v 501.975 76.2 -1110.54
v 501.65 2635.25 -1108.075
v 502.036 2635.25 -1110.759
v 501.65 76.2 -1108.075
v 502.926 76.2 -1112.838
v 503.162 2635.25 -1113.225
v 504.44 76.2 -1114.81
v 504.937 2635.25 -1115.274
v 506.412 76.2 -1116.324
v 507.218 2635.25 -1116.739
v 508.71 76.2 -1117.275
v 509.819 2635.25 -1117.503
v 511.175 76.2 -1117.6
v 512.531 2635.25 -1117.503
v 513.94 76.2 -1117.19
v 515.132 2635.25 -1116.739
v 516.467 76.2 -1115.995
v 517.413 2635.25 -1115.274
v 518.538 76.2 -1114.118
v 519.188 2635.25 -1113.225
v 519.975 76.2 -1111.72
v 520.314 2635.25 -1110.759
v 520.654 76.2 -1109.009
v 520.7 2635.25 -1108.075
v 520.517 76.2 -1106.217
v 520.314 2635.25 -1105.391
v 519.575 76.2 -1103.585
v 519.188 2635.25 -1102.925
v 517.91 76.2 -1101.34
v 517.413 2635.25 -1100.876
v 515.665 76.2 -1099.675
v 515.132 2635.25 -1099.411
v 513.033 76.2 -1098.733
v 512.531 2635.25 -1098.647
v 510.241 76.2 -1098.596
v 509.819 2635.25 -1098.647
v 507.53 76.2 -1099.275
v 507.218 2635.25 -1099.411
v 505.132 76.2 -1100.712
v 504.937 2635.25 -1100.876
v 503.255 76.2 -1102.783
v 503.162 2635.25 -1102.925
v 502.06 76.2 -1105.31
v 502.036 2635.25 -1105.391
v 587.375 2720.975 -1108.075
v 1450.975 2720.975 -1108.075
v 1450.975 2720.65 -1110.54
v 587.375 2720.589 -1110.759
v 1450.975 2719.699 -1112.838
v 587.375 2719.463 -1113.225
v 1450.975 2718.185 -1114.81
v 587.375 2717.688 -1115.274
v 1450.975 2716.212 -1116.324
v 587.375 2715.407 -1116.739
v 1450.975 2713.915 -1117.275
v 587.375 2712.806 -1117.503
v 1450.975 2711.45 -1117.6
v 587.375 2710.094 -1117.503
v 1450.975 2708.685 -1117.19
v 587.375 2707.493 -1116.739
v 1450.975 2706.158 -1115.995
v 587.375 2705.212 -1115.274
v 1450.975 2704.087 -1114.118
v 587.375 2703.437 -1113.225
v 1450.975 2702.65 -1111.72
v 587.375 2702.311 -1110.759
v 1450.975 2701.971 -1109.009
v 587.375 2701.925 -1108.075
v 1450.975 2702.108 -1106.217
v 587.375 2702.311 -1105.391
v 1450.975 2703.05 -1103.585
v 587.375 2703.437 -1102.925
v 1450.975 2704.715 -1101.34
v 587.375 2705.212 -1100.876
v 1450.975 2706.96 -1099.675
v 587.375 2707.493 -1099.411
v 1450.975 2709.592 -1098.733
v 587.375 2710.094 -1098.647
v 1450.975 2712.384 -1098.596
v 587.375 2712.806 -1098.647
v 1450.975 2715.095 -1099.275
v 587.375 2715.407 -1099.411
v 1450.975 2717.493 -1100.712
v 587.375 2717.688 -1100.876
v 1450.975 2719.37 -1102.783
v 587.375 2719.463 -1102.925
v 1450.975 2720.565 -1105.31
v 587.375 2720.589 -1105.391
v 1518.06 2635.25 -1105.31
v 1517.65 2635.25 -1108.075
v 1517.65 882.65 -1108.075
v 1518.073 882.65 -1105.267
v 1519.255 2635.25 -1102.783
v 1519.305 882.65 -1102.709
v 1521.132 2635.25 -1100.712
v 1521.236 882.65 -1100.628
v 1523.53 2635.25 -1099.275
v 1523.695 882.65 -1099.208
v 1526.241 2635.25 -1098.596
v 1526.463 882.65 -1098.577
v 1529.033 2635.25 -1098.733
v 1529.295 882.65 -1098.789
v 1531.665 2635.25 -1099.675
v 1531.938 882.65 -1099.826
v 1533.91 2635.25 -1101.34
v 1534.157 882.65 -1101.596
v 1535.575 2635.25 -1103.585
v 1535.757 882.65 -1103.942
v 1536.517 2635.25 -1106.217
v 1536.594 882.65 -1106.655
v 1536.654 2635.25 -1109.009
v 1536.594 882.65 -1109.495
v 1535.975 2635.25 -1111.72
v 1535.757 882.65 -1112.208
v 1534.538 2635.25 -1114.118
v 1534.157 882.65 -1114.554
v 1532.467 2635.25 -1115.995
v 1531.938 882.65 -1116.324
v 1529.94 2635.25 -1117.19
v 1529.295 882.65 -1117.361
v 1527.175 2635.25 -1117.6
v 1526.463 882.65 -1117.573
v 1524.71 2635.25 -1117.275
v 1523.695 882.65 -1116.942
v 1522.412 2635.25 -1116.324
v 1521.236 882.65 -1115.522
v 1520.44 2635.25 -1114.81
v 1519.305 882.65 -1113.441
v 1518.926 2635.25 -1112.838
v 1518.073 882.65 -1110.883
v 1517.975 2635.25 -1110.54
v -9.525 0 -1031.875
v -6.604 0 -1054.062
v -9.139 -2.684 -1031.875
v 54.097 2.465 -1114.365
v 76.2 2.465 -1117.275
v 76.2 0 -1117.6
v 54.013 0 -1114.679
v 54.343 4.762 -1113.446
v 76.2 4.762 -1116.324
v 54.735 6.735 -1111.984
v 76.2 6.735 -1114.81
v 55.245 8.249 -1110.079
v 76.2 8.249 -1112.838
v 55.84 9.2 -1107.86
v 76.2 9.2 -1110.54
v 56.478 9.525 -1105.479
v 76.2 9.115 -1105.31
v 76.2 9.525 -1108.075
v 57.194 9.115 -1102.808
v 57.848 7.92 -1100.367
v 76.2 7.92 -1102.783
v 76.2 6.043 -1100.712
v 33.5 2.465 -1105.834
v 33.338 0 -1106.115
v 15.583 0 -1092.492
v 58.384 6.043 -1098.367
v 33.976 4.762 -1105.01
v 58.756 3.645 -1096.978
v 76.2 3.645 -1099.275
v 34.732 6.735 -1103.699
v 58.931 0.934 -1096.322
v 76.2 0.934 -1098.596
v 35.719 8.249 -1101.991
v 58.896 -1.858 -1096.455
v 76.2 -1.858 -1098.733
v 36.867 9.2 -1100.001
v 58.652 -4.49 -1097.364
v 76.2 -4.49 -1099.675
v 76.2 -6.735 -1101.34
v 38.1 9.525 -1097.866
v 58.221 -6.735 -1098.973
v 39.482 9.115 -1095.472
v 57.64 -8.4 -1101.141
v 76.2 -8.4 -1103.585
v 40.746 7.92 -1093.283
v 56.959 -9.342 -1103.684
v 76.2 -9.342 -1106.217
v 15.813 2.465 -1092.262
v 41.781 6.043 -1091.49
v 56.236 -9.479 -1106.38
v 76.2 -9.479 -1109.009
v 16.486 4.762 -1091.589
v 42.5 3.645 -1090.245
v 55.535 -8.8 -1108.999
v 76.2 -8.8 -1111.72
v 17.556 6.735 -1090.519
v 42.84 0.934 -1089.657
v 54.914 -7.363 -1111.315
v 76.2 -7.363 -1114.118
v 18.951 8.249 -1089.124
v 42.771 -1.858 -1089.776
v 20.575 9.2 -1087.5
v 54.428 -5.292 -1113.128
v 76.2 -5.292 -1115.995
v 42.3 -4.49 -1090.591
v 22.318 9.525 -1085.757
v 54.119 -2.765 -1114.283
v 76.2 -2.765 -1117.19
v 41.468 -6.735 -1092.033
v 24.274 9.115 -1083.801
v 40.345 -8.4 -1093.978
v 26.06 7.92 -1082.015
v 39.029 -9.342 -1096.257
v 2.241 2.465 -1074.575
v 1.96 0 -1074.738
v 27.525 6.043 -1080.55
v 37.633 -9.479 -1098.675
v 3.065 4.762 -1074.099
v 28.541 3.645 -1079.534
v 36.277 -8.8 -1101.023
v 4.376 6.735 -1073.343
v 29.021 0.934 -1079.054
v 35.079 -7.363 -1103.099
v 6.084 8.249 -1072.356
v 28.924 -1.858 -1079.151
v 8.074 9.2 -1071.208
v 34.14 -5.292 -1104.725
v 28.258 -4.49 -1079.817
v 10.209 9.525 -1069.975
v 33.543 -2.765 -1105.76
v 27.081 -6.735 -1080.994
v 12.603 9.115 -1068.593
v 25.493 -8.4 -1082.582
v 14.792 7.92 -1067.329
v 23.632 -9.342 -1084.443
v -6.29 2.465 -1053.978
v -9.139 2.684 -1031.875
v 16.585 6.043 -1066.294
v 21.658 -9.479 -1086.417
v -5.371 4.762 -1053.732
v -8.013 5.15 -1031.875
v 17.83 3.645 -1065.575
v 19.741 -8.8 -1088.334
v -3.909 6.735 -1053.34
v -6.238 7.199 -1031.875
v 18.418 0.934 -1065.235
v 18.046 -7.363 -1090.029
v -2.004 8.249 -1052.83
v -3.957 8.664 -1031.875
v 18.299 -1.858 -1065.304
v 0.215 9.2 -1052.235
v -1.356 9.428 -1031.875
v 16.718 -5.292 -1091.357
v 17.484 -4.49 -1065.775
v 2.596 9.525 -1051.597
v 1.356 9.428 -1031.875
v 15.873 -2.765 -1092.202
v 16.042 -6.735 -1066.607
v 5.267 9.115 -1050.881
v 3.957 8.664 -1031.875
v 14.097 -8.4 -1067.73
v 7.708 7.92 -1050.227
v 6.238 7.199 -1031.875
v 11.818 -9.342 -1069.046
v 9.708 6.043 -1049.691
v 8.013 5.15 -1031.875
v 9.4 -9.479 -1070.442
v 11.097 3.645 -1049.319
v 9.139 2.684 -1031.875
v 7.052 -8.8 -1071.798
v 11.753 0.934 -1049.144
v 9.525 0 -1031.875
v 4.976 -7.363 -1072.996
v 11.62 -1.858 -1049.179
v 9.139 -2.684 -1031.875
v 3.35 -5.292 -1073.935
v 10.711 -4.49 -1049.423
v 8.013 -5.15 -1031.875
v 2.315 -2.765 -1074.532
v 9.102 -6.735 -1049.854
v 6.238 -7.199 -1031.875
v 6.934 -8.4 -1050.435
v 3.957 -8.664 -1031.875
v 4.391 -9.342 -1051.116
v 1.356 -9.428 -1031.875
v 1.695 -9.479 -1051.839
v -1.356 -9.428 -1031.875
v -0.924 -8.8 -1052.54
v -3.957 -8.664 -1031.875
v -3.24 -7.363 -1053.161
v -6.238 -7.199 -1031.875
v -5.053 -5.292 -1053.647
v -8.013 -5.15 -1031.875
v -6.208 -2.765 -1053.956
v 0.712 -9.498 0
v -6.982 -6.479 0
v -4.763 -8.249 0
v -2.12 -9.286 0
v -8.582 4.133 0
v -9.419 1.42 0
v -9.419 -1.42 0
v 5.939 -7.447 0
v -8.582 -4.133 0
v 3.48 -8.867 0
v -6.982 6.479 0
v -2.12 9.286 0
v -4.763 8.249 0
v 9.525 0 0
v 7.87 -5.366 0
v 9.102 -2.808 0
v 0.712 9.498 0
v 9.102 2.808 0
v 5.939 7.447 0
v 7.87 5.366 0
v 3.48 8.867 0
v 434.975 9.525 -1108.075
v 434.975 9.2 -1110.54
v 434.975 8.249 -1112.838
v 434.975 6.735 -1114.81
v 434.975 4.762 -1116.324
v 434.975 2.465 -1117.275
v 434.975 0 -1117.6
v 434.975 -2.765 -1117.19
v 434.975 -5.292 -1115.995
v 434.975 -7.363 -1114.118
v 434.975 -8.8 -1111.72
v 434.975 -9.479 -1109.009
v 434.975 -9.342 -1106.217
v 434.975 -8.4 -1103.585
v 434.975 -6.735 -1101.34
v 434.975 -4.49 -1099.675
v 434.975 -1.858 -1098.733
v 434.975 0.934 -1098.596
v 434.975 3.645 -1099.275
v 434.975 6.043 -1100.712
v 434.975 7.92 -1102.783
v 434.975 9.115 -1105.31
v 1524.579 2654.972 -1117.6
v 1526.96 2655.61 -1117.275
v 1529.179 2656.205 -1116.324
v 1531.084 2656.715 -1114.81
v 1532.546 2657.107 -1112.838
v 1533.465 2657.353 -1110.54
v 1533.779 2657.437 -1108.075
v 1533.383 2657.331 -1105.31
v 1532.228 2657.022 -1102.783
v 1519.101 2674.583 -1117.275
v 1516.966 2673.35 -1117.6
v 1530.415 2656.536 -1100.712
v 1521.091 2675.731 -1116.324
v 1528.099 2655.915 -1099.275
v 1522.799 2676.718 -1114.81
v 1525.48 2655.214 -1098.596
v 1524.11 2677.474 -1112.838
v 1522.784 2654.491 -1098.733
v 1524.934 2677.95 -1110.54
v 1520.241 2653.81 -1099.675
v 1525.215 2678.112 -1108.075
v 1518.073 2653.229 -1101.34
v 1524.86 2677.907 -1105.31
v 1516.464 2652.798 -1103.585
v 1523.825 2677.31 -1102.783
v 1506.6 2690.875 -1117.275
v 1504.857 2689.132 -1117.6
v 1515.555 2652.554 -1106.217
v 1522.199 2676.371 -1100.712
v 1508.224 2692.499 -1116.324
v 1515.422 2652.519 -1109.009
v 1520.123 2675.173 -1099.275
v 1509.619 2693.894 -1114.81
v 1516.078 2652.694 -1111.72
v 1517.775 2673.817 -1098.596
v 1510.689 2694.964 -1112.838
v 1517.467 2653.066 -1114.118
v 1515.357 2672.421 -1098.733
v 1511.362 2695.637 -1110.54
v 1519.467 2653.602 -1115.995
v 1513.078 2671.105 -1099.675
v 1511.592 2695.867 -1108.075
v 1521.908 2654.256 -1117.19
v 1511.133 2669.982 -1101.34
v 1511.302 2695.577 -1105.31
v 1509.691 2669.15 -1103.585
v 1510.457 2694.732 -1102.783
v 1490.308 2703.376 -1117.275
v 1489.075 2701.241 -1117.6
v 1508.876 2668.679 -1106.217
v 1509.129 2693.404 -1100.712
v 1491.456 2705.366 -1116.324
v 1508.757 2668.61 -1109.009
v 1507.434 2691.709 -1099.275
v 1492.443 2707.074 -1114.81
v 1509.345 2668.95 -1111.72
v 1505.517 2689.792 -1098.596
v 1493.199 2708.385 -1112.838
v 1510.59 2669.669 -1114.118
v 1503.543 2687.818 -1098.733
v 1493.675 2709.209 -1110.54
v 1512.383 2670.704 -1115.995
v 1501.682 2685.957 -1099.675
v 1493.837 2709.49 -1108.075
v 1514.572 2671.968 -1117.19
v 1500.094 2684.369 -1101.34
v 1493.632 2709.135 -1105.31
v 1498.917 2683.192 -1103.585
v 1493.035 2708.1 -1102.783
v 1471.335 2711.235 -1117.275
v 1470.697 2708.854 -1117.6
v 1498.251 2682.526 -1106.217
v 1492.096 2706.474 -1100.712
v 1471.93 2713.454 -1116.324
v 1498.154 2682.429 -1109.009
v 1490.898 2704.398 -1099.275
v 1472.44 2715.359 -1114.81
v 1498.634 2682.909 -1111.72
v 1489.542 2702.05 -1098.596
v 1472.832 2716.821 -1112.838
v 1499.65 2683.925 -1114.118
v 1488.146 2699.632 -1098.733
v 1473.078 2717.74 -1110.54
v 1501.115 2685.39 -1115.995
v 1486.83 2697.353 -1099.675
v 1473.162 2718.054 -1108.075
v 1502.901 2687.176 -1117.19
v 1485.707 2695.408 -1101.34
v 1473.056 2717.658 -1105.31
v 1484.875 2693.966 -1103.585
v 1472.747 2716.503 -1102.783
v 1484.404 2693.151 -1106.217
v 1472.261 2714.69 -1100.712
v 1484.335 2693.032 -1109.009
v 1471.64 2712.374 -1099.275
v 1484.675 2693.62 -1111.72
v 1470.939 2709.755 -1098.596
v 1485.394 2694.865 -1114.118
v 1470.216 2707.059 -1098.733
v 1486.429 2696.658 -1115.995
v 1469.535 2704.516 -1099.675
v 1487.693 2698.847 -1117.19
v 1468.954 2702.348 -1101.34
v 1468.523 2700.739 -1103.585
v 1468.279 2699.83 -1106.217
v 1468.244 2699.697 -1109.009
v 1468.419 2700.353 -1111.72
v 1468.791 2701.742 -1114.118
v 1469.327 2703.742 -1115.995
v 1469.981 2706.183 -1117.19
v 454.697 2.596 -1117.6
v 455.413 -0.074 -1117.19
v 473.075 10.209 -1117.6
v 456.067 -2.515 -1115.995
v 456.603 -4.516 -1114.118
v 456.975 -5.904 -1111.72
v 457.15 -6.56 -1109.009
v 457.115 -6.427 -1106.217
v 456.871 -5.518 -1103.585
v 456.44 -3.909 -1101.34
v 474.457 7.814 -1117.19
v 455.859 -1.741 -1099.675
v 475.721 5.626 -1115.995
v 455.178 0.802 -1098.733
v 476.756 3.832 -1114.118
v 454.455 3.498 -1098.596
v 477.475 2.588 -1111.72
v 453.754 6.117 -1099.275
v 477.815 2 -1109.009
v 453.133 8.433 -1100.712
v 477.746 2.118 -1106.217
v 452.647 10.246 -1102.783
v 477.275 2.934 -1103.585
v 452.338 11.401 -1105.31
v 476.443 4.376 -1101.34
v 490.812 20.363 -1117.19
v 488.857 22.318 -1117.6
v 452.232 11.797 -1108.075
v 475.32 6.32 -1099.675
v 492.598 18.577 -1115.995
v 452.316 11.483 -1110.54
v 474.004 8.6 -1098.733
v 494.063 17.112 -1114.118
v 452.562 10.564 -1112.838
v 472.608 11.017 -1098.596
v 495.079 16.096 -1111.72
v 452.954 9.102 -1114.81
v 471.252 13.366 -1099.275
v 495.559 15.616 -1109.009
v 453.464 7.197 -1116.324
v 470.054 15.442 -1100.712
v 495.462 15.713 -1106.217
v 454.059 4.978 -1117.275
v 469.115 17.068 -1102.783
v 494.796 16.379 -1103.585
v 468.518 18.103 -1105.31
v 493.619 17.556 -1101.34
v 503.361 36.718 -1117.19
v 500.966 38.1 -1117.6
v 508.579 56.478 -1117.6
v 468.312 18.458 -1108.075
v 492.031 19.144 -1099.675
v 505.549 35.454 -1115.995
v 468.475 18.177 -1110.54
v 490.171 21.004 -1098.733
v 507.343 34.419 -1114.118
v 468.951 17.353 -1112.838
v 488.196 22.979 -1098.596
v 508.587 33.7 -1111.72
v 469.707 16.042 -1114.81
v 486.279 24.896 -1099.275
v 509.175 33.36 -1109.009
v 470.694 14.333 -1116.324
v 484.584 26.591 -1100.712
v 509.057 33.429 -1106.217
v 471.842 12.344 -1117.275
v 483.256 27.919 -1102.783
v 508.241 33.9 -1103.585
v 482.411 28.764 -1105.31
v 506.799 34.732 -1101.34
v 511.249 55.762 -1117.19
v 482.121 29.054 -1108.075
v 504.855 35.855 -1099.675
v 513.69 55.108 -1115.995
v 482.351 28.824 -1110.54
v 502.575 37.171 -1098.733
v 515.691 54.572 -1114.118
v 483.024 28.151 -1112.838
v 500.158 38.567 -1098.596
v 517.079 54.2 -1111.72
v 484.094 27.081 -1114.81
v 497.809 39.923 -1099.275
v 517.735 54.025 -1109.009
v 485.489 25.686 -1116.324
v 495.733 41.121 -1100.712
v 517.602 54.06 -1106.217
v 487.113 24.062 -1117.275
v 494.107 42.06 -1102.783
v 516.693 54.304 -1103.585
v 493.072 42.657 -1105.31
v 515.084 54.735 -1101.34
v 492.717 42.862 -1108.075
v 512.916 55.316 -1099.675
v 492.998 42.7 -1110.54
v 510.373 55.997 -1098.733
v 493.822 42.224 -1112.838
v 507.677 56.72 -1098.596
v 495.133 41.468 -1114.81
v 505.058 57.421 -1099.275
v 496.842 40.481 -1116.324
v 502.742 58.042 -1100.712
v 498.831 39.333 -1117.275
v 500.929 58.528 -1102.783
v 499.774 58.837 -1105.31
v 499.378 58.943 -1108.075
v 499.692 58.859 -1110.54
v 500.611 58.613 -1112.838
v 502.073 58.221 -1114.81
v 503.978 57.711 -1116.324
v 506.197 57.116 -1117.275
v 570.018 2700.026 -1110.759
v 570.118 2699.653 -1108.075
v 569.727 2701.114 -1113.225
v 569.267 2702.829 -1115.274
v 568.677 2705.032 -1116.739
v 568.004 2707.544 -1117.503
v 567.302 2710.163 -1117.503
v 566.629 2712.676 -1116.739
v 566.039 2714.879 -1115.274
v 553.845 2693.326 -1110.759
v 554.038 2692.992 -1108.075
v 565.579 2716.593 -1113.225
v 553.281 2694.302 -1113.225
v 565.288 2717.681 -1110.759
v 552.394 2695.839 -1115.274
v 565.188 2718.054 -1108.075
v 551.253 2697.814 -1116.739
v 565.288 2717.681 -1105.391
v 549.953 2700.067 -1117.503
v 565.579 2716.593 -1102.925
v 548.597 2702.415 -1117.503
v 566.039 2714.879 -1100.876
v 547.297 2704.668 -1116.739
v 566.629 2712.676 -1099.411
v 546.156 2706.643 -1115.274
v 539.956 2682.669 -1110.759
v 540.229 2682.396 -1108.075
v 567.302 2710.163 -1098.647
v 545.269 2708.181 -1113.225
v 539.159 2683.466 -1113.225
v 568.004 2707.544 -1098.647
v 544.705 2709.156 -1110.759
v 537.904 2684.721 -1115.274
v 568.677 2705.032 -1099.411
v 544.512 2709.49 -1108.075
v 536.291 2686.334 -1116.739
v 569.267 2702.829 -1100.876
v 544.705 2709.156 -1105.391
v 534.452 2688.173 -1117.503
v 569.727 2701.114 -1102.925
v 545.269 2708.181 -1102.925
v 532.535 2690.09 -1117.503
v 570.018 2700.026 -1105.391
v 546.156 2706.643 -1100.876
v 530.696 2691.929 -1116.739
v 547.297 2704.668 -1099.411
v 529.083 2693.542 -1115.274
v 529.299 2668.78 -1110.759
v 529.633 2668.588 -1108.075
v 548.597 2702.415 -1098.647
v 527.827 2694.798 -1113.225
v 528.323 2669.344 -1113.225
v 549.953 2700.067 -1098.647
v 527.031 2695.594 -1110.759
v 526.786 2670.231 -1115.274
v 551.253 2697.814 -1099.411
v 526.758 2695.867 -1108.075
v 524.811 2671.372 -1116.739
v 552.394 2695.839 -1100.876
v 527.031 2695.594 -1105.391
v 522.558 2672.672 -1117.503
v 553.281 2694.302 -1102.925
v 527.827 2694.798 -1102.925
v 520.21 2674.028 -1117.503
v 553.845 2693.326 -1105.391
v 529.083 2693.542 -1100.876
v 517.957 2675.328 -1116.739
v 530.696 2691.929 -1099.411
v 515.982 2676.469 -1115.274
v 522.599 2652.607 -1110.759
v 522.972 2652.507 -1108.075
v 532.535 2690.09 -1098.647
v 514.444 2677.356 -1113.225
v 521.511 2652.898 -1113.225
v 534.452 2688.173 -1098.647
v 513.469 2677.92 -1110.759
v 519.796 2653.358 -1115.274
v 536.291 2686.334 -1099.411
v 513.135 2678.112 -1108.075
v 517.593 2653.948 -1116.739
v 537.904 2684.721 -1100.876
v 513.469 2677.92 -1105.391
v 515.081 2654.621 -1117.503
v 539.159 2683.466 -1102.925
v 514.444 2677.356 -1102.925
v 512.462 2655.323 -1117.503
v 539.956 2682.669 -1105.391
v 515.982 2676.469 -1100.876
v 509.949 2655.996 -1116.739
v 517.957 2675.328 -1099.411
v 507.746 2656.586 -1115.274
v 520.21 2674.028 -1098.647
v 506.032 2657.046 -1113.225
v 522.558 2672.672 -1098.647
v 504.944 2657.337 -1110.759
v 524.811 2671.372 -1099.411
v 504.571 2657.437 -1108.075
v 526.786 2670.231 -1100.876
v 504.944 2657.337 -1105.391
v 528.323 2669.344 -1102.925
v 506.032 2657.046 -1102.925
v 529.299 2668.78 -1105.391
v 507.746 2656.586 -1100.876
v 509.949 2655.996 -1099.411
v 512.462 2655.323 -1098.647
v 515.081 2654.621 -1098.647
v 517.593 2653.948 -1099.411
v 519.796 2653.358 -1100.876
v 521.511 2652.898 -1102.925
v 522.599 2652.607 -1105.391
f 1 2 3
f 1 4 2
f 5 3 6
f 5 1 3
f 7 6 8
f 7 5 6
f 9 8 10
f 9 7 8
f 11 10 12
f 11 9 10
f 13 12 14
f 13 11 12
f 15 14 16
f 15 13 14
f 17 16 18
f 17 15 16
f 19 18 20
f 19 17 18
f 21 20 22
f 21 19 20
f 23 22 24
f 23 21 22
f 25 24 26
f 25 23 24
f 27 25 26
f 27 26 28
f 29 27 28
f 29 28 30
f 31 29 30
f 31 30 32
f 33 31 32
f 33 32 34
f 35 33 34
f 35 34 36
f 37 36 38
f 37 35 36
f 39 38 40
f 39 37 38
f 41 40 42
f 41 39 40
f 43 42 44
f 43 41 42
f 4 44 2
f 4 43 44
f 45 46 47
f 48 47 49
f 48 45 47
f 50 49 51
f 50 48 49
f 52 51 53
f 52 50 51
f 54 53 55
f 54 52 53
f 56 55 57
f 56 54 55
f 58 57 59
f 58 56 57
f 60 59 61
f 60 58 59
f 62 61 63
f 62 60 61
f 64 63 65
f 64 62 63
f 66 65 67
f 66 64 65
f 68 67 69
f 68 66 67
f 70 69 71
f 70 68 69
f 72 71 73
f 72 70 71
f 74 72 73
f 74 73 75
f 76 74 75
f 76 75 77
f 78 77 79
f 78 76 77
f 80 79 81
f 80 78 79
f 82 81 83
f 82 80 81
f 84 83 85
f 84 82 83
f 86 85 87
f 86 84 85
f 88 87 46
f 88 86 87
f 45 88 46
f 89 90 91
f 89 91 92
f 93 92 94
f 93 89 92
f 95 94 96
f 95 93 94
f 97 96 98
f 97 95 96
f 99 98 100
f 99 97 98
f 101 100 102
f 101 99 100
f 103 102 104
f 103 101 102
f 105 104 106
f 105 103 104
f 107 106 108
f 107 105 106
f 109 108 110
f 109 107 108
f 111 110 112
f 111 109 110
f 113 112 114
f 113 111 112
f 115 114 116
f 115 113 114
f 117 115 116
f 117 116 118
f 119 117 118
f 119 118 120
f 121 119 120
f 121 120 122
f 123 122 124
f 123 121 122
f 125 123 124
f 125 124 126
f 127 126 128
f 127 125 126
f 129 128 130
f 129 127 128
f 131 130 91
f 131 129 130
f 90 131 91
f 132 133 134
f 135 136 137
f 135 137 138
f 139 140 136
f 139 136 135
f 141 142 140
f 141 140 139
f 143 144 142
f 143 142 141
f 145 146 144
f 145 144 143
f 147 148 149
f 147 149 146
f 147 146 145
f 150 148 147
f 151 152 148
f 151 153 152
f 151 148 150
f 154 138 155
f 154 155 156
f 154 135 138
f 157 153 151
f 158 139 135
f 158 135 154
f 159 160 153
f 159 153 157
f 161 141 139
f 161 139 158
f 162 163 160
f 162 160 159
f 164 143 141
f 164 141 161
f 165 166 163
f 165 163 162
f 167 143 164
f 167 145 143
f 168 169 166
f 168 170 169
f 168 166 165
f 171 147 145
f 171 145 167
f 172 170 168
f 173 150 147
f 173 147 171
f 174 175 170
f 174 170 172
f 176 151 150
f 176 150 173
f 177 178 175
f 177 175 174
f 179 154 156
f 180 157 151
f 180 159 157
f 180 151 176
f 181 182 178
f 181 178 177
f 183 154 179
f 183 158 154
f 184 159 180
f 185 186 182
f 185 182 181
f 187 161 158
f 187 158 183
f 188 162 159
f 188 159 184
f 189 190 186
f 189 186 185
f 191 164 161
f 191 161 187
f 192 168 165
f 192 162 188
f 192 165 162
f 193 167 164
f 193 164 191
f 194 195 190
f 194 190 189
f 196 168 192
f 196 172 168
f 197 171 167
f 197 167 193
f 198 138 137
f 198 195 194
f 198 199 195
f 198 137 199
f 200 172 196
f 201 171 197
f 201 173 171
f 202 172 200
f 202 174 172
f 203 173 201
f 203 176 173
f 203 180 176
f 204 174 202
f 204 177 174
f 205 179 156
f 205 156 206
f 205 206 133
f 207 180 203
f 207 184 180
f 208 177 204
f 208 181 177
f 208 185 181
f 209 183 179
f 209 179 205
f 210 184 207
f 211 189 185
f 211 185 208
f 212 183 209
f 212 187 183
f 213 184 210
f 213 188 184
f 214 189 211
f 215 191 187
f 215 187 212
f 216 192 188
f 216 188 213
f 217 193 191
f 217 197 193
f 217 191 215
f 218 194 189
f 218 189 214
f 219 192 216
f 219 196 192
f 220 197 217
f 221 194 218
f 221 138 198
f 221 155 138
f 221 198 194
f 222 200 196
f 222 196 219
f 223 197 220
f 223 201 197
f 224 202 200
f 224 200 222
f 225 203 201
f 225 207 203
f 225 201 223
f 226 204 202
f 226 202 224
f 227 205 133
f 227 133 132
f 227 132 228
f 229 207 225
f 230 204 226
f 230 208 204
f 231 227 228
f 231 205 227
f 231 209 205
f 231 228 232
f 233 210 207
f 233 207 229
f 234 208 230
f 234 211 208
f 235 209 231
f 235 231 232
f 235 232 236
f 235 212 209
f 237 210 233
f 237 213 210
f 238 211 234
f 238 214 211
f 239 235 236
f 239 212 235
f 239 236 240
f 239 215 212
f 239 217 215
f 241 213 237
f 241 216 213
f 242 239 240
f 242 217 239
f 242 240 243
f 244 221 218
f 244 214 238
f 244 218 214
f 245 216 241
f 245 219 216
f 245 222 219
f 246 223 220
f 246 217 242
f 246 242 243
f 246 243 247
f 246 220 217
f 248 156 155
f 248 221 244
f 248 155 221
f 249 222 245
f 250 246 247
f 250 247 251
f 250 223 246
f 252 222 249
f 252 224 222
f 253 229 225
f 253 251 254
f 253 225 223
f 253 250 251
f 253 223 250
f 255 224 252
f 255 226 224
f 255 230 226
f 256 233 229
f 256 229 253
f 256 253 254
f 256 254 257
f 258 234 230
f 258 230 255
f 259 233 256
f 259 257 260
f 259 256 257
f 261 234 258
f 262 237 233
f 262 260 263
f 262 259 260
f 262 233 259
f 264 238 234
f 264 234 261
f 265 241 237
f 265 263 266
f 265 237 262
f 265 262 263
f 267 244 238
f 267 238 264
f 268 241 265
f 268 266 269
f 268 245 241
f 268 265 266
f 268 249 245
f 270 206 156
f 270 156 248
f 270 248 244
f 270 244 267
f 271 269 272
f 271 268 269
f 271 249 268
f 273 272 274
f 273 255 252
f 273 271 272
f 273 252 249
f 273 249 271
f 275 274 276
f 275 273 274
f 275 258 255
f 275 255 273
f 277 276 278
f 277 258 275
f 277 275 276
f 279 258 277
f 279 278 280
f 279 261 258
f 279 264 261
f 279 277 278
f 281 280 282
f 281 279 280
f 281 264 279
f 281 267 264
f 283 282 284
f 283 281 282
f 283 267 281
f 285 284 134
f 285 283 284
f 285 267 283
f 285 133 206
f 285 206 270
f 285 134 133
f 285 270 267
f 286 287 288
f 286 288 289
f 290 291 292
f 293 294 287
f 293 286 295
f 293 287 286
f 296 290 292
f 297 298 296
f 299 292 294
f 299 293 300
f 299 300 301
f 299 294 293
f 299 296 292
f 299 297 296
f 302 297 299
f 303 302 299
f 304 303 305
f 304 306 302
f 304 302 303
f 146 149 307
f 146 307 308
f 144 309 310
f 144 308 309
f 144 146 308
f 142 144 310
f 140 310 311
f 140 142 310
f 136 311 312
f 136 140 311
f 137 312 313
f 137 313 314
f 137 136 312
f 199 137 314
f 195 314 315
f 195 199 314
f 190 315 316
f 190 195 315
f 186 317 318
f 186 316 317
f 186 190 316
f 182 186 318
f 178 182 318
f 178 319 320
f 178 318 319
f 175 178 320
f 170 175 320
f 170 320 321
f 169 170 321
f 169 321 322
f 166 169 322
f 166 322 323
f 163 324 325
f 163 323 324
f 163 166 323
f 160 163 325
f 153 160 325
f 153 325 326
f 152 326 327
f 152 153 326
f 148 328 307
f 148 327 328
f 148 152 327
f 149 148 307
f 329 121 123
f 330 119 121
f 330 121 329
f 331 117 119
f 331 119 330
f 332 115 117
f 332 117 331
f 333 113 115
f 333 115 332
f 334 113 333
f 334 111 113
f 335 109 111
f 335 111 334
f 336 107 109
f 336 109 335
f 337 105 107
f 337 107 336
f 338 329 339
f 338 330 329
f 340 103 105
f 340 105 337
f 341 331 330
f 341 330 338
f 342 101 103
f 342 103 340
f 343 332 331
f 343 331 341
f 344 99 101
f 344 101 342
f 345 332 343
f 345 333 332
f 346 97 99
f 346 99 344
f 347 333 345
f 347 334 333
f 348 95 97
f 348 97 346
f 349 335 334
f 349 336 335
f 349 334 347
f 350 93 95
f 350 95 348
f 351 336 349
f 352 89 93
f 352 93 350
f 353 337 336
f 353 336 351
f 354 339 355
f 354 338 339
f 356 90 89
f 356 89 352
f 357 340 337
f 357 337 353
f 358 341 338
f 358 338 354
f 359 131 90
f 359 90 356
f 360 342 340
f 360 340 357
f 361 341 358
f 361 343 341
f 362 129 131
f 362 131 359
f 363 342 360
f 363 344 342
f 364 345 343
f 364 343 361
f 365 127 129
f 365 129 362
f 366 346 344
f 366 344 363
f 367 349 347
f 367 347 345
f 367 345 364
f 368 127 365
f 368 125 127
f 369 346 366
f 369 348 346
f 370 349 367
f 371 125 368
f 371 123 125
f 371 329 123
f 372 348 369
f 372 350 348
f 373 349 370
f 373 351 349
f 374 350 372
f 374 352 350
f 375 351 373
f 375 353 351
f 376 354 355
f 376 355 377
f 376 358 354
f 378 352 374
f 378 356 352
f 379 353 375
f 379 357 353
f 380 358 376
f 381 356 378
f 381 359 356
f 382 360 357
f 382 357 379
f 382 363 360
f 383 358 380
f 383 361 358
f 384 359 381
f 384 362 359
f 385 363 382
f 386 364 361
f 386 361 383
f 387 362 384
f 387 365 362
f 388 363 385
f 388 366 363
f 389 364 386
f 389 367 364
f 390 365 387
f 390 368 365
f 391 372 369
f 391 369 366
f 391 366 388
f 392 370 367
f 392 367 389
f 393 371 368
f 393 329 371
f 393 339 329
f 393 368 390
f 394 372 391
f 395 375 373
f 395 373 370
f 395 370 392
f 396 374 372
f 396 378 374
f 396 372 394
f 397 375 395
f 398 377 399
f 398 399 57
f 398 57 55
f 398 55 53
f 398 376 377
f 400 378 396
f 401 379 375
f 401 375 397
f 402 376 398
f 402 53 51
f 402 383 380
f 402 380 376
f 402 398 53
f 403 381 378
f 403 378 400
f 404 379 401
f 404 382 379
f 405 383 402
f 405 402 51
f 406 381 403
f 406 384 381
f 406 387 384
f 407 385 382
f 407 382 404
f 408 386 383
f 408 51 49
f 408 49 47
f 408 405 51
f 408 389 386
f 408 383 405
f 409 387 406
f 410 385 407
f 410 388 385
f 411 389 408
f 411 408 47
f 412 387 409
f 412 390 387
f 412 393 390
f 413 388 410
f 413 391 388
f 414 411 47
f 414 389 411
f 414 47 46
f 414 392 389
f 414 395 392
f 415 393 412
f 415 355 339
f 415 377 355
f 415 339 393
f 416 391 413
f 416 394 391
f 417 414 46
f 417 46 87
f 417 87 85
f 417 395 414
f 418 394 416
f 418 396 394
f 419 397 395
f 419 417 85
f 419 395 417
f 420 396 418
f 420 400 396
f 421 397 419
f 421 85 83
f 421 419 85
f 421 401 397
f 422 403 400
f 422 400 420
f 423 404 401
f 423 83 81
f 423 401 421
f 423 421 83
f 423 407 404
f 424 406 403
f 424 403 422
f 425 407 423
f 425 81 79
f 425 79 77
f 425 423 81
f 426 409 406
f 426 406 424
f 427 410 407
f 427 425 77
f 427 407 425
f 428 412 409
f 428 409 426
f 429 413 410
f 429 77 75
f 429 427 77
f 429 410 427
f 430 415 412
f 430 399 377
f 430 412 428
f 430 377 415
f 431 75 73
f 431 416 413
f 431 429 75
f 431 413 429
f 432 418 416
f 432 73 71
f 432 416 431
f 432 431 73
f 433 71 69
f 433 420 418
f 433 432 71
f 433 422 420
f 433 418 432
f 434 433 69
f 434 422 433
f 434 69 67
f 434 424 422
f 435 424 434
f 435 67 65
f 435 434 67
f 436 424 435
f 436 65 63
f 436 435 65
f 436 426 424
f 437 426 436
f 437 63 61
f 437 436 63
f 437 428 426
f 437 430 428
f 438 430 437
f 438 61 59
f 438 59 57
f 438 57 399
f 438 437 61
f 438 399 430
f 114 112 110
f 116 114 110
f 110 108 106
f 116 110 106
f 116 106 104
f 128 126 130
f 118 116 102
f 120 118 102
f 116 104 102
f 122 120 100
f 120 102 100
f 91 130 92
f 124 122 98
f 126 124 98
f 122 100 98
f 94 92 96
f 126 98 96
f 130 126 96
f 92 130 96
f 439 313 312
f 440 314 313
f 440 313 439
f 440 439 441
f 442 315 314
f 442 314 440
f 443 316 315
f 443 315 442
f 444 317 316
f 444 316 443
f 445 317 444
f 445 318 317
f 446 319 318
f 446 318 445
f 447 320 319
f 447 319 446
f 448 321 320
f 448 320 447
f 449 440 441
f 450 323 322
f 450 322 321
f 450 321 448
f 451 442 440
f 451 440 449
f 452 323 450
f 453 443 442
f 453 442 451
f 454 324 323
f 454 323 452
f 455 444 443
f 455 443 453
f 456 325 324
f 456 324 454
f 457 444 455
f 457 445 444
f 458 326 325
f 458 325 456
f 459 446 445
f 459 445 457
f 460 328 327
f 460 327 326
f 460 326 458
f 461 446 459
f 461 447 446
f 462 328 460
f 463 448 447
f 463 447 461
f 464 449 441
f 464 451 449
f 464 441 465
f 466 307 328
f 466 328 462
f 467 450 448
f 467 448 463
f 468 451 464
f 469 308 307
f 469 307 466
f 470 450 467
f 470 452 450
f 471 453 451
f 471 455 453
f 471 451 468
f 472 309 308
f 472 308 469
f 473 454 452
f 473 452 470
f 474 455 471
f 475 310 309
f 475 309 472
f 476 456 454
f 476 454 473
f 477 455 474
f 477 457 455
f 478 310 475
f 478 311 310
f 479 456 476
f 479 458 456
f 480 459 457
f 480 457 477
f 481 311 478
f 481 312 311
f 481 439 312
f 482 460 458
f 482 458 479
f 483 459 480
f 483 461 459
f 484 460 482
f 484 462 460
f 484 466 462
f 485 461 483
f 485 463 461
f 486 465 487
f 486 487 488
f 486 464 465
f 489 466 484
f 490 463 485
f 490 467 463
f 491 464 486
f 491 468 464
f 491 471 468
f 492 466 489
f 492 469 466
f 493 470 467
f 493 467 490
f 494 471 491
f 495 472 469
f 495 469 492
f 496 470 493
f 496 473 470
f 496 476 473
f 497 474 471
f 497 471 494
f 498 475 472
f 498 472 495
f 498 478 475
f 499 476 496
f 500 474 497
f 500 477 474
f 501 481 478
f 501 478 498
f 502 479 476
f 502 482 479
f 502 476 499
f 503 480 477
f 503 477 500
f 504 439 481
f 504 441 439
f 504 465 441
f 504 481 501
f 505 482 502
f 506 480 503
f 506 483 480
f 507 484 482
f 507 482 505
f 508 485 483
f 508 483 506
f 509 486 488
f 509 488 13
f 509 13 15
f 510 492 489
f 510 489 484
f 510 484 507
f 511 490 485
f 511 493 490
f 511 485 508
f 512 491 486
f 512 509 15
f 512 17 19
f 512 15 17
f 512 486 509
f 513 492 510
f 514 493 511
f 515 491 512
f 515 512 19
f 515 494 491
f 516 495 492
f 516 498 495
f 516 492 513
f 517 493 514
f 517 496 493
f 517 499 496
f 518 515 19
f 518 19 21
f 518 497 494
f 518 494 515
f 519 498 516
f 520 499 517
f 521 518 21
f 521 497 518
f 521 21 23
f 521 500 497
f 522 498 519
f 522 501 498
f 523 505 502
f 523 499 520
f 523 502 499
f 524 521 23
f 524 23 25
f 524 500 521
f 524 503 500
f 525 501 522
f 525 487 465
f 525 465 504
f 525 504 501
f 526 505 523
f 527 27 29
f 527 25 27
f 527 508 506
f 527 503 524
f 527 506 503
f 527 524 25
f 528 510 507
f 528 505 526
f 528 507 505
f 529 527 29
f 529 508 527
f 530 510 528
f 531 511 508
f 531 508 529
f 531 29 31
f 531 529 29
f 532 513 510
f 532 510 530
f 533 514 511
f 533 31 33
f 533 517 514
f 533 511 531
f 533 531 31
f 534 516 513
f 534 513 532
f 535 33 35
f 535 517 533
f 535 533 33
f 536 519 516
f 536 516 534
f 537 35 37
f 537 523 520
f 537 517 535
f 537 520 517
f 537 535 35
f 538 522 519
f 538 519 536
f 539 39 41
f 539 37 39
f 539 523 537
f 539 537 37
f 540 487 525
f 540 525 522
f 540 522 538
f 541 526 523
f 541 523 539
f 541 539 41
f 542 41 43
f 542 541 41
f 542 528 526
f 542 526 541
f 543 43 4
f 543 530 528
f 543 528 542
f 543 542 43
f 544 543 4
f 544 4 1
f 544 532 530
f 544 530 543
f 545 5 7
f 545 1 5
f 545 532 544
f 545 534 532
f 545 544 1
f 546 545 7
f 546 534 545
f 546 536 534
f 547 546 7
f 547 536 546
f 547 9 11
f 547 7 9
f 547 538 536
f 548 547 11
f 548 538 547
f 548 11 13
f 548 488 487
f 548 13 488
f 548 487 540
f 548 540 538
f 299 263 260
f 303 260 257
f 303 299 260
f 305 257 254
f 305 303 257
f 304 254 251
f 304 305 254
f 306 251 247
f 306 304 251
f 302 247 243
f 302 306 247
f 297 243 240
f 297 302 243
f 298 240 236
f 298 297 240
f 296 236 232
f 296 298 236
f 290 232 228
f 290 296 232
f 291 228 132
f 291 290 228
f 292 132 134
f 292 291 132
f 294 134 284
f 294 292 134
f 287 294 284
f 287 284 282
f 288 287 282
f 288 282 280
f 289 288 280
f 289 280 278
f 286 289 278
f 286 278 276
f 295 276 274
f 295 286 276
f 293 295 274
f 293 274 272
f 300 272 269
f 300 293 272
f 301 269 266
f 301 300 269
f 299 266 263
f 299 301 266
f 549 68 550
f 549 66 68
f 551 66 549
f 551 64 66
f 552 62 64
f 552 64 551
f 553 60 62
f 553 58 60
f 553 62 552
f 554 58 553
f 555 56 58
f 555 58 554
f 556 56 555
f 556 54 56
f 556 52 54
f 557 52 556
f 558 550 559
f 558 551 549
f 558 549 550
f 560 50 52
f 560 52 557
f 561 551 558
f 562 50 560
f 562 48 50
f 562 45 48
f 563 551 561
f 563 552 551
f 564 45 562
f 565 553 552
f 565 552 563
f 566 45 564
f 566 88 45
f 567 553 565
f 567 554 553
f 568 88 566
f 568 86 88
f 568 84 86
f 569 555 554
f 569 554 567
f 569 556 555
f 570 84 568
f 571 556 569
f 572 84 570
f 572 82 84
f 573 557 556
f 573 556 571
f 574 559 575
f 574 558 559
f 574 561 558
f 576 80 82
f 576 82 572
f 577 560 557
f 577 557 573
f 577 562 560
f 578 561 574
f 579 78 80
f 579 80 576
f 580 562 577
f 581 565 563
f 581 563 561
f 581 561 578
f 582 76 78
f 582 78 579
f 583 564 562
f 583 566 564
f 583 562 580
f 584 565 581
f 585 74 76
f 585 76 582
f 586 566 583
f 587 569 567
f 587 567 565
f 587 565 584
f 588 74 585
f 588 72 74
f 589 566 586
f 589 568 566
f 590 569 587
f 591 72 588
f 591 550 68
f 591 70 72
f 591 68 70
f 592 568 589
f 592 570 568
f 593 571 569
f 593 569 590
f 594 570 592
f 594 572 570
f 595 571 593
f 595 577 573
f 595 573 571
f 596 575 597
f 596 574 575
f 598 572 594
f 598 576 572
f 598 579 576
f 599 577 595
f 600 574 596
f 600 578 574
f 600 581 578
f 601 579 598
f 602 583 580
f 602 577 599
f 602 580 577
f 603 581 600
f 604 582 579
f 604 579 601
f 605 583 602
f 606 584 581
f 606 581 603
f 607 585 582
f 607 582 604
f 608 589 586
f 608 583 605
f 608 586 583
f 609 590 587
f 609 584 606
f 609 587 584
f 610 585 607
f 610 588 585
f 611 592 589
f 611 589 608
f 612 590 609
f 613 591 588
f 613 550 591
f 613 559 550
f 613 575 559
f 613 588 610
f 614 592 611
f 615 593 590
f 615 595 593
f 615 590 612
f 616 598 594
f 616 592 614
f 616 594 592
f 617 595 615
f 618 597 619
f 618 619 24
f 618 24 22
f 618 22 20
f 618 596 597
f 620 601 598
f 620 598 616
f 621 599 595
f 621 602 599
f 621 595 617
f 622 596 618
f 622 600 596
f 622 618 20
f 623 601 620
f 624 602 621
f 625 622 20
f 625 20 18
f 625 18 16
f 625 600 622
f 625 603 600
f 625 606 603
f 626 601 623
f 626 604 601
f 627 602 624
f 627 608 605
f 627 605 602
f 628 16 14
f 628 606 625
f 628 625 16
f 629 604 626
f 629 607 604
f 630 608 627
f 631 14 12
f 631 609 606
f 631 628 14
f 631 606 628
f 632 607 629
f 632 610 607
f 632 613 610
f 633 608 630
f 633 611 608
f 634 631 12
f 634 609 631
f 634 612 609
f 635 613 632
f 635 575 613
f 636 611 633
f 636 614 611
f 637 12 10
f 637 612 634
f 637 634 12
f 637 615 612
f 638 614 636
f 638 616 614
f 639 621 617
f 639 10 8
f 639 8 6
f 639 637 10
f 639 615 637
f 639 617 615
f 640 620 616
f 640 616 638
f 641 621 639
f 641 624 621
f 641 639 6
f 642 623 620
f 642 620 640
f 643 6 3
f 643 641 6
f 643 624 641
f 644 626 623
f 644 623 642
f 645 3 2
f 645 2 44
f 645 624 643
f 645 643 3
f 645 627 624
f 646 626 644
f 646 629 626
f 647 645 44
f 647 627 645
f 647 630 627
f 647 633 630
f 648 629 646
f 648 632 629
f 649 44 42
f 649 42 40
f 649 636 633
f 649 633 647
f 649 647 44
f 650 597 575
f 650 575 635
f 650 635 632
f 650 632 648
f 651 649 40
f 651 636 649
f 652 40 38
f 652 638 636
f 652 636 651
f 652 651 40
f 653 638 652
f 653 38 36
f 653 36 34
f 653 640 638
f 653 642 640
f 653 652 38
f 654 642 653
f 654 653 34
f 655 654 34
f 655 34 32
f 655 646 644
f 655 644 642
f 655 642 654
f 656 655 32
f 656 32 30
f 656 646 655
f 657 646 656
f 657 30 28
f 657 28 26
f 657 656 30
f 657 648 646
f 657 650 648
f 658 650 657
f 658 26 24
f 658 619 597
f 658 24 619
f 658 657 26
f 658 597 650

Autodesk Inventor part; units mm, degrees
sketch "Sketch2" plane through (0, 0, 0) normal (0, 0, 1) x (1, 0, 0)
  circle A0 centre (0, 0) radius 9.525
  dimension "d3" = 19.05
extrude "Extrusion2" add sketch "Sketch2" against normal blind 1031.875
ref_plane "Work Plane1" through (76.2, 0, 0) normal (1, 0, 0) x (0, 1, 0)
sketch "Sketch9" plane through (76.2, 0, 0) normal (1, 0, 0) x (0, 1, 0)
  line L0 (-9.525, -1031.875) -> (9.525, -1031.875) projected
  circle A0 centre (0, -1108.075) radius 9.525
  line L1 (0, -1031.875) -> (0, -1108.075) construction
  point P0 (0, 0)
  dimension "d17" = 19.05
  dimension "d18" = 76.2
extrude "Extrusion4" add sketch "Sketch9" along normal blind 358.775
sketch "Sketch11" plane through (0, 0, -1031.875) normal (0, 0, -1) x (-1, 0, 0)
  circle A0 centre (0, 0) radius 9.525 projected
sketch "Sketch12" plane through (0, 0, 0) normal (0, 1, 0) x (-1, 0, 0)
  line L0 (-76.2, -1117.6) -> (-76.2, -1098.55) projected
  line L1 (-9.525, -1031.875) -> (9.525, -1031.875) projected
  arc A0 (-76.2, -1108.075) -> (0, -1031.875) centre (-76.2, -1031.875) ccw
  point P0 (0, 0)
  dimension "d21" = 76.2
sweep "Sweep2" add profiles "Sketch11" path "Sketch12" path curves A0
ref_plane "Work Plane3" through (0, 76.2, 0) normal (0, 1, 0) x (-1, 0, 0)
sketch "Sketch13" plane through (0, 76.2, 0) normal (0, 1, 0) x (-1, 0, 0)
  line L0 (-434.975, -1098.55) -> (-434.975, -1117.6) projected
  circle A0 centre (-511.175, -1108.075) radius 9.525
  line L1 (-434.975, -1108.075) -> (-511.175, -1108.075) construction
  point P0 (0, 0)
  dimension "d25" = 19.05
  dimension "d26" = 76.2
extrude "Extrusion5" add sketch "Sketch13" along normal blind 2559.05
sketch "Sketch14" plane through (434.975, 0, -1108.075) normal (1, 0, 0) x (0, 0, -1)
  circle A0 centre (0, 0) radius 9.525 projected
  point P0 (-1108.075, 0)
ref_plane "Work Plane5" through (434.975, 0, -1108.075) normal (0, 0, 1) x (1, 0, 0)
sketch "Sketch15" plane through (434.975, 0, -1108.075) normal (0, 0, 1) x (1, 0, 0)
  line L0 (66.675, 76.2) -> (85.725, 76.2) projected
  arc A0 (0, 0) -> (76.2, 76.2) centre (0, 76.2) ccw
  line L1 (0, -9.525) -> (0, 9.525) projected
  point P0 (-434.975, 0)
  dimension "d29" = 76.2
sweep "Sweep3" add profiles "Sketch14" path "Sketch15" path curves A0
sketch "Sketch16" plane through (511.175, 2635.25, -1108.075) normal (0, 1, 0) x (1, 0, 0)
  circle A0 centre (0, 0) radius 9.525 projected
  point P0 (-511.175, -1108.075)
ref_plane "Work Plane10" through (511.175, 2635.25, -1108.075) normal (1, 0, 0) x (0, 1, 0)
ref_plane "Work Plane11" through (587.375, 2635.25, -1108.075) normal (1, 0, 0) x (0, 1, 0)
sketch "Sketch18" plane through (587.375, 2635.25, -1108.075) normal (1, 0, 0) x (0, 1, 0)
  circle A0 centre (76.2, 0) radius 9.525
  line L0 (0, -9.525) -> (0, 9.525) projected
  line L1 (76.2, 0) -> (0, 0) construction
  point P0 (-2635.25, 1108.075)
  dimension "d37" = 19.05
  dimension "d38" = 76.2
extrude "Extrusion7" add sketch "Sketch18" along normal blind 863.6
ref_plane "Work Plane12" through (1019.175, 2711.45, -1108.075) normal (1, 0, 0) x (0, 0, -1)
sketch "Sketch21" plane through (1450.975, 2711.45, -1108.075) normal (1, 0, 0) x (0, 0, -1)
  circle A0 centre (0, 0) radius 9.525 projected
  point P0 (-1108.075, -2711.45)
ref_plane "Work Plane14" through (1450.975, 2635.25, -1108.075) normal (0, 1, 0) x (-1, 0, 0)
ref_plane "Work Plane13" through (1450.975, 2711.45, -1108.075) normal (0, 1, 0) x (-1, 0, 0)
sketch "Sketch23" plane through (1450.975, 2635.25, -1108.075) normal (0, 1, 0) x (-1, 0, 0)
  circle A0 centre (-76.2, 0) radius 9.525
  line L0 (0, 9.525) -> (0, -9.525) projected
  line L1 (-76.2, 0) -> (0, 0) construction
  point P0 (1450.975, 1108.075)
  dimension "d45" = 19.05
  dimension "d46" = 76.2
extrude "Extrusion9" add sketch "Sketch23" against normal blind 1752.6
sketch "Sketch24" plane through (434.975, 0, -1108.075) normal (0, 0, 1) x (1, 0, 0)
  line L0 (152.4, 2720.975) -> (152.4, 2701.925) projected
  line L1 (85.725, 2635.25) -> (66.675, 2635.25) projected
  arc A0 (152.4, 2711.45) -> (76.2, 2635.25) centre (152.4, 2635.25) ccw
  point P0 (-434.975, 0)
  dimension "d49" = 76.2
sweep "Sweep4" add profiles "Sketch16" path "Sketch24" path curves A0
sketch "Sketch25" plane through (434.975, 0, -1108.075) normal (0, 0, 1) x (1, 0, 0)
  line L0 (1082.675, 2635.25) -> (1101.725, 2635.25) projected
  line L1 (1016, 2701.925) -> (1016, 2720.975) projected
  arc A0 (1092.2, 2635.25) -> (1016, 2711.45) centre (1016, 2635.25) ccw
  point P0 (-434.975, 0)
  dimension "d52" = 76.2
sweep "Sweep5" add profiles "Sketch21" path "Sketch25" path curves A0
equation "\"d3\" = tubeD"
equation "\"d17\" = tubeD"
equation "\"d18\" = tubeTurnR"
equation "\"d21\" = tubeTurnR"
equation "\"d26\" = tubeTurnR"
equation "\"d29\" = tubeTurnR"
equation "\"d38\" = tubeTurnR"
equation "\"d39\" = 0.333333 * roomWidth - 2 * tubeTurnR"
equation "\"d46\" = tubeTurnR"
equation "\"d47\" = 0.5 * roomDepth - tubeTurnR"
equation "\"d49\" = tubeTurnR"
equation "\"d52\" = tubeTurnR"
equation "\"d4\" = tubeTurnR"
equation "\"wallThick\" = 44.45"
equation "\"roomWidth\" = 3048"
equation "\"roomDepth\" = 3657.6"
equation "\"roomHeight\" = 2438.4"
equation "\"doorWidth\" = 895.35"
equation "\"doorHeight\" = 2108.2"
equation "\"doorX\" = 774.7"
equation "\"doorY\" = 88.9"
equation "\"doorLip\" = 76.2"
equation "\"doorThick\" = 57.15"
equation "\"tubeTurnR\" = 76.2"
equation "\"tubeD\" = 19.05"
equation "\"d24\" = tubeTurnR"
equation "\"d36\" = tubeTurnR"
equation "\"d44\" = -tubeTurnR"
properties part number "front_tube_up"
